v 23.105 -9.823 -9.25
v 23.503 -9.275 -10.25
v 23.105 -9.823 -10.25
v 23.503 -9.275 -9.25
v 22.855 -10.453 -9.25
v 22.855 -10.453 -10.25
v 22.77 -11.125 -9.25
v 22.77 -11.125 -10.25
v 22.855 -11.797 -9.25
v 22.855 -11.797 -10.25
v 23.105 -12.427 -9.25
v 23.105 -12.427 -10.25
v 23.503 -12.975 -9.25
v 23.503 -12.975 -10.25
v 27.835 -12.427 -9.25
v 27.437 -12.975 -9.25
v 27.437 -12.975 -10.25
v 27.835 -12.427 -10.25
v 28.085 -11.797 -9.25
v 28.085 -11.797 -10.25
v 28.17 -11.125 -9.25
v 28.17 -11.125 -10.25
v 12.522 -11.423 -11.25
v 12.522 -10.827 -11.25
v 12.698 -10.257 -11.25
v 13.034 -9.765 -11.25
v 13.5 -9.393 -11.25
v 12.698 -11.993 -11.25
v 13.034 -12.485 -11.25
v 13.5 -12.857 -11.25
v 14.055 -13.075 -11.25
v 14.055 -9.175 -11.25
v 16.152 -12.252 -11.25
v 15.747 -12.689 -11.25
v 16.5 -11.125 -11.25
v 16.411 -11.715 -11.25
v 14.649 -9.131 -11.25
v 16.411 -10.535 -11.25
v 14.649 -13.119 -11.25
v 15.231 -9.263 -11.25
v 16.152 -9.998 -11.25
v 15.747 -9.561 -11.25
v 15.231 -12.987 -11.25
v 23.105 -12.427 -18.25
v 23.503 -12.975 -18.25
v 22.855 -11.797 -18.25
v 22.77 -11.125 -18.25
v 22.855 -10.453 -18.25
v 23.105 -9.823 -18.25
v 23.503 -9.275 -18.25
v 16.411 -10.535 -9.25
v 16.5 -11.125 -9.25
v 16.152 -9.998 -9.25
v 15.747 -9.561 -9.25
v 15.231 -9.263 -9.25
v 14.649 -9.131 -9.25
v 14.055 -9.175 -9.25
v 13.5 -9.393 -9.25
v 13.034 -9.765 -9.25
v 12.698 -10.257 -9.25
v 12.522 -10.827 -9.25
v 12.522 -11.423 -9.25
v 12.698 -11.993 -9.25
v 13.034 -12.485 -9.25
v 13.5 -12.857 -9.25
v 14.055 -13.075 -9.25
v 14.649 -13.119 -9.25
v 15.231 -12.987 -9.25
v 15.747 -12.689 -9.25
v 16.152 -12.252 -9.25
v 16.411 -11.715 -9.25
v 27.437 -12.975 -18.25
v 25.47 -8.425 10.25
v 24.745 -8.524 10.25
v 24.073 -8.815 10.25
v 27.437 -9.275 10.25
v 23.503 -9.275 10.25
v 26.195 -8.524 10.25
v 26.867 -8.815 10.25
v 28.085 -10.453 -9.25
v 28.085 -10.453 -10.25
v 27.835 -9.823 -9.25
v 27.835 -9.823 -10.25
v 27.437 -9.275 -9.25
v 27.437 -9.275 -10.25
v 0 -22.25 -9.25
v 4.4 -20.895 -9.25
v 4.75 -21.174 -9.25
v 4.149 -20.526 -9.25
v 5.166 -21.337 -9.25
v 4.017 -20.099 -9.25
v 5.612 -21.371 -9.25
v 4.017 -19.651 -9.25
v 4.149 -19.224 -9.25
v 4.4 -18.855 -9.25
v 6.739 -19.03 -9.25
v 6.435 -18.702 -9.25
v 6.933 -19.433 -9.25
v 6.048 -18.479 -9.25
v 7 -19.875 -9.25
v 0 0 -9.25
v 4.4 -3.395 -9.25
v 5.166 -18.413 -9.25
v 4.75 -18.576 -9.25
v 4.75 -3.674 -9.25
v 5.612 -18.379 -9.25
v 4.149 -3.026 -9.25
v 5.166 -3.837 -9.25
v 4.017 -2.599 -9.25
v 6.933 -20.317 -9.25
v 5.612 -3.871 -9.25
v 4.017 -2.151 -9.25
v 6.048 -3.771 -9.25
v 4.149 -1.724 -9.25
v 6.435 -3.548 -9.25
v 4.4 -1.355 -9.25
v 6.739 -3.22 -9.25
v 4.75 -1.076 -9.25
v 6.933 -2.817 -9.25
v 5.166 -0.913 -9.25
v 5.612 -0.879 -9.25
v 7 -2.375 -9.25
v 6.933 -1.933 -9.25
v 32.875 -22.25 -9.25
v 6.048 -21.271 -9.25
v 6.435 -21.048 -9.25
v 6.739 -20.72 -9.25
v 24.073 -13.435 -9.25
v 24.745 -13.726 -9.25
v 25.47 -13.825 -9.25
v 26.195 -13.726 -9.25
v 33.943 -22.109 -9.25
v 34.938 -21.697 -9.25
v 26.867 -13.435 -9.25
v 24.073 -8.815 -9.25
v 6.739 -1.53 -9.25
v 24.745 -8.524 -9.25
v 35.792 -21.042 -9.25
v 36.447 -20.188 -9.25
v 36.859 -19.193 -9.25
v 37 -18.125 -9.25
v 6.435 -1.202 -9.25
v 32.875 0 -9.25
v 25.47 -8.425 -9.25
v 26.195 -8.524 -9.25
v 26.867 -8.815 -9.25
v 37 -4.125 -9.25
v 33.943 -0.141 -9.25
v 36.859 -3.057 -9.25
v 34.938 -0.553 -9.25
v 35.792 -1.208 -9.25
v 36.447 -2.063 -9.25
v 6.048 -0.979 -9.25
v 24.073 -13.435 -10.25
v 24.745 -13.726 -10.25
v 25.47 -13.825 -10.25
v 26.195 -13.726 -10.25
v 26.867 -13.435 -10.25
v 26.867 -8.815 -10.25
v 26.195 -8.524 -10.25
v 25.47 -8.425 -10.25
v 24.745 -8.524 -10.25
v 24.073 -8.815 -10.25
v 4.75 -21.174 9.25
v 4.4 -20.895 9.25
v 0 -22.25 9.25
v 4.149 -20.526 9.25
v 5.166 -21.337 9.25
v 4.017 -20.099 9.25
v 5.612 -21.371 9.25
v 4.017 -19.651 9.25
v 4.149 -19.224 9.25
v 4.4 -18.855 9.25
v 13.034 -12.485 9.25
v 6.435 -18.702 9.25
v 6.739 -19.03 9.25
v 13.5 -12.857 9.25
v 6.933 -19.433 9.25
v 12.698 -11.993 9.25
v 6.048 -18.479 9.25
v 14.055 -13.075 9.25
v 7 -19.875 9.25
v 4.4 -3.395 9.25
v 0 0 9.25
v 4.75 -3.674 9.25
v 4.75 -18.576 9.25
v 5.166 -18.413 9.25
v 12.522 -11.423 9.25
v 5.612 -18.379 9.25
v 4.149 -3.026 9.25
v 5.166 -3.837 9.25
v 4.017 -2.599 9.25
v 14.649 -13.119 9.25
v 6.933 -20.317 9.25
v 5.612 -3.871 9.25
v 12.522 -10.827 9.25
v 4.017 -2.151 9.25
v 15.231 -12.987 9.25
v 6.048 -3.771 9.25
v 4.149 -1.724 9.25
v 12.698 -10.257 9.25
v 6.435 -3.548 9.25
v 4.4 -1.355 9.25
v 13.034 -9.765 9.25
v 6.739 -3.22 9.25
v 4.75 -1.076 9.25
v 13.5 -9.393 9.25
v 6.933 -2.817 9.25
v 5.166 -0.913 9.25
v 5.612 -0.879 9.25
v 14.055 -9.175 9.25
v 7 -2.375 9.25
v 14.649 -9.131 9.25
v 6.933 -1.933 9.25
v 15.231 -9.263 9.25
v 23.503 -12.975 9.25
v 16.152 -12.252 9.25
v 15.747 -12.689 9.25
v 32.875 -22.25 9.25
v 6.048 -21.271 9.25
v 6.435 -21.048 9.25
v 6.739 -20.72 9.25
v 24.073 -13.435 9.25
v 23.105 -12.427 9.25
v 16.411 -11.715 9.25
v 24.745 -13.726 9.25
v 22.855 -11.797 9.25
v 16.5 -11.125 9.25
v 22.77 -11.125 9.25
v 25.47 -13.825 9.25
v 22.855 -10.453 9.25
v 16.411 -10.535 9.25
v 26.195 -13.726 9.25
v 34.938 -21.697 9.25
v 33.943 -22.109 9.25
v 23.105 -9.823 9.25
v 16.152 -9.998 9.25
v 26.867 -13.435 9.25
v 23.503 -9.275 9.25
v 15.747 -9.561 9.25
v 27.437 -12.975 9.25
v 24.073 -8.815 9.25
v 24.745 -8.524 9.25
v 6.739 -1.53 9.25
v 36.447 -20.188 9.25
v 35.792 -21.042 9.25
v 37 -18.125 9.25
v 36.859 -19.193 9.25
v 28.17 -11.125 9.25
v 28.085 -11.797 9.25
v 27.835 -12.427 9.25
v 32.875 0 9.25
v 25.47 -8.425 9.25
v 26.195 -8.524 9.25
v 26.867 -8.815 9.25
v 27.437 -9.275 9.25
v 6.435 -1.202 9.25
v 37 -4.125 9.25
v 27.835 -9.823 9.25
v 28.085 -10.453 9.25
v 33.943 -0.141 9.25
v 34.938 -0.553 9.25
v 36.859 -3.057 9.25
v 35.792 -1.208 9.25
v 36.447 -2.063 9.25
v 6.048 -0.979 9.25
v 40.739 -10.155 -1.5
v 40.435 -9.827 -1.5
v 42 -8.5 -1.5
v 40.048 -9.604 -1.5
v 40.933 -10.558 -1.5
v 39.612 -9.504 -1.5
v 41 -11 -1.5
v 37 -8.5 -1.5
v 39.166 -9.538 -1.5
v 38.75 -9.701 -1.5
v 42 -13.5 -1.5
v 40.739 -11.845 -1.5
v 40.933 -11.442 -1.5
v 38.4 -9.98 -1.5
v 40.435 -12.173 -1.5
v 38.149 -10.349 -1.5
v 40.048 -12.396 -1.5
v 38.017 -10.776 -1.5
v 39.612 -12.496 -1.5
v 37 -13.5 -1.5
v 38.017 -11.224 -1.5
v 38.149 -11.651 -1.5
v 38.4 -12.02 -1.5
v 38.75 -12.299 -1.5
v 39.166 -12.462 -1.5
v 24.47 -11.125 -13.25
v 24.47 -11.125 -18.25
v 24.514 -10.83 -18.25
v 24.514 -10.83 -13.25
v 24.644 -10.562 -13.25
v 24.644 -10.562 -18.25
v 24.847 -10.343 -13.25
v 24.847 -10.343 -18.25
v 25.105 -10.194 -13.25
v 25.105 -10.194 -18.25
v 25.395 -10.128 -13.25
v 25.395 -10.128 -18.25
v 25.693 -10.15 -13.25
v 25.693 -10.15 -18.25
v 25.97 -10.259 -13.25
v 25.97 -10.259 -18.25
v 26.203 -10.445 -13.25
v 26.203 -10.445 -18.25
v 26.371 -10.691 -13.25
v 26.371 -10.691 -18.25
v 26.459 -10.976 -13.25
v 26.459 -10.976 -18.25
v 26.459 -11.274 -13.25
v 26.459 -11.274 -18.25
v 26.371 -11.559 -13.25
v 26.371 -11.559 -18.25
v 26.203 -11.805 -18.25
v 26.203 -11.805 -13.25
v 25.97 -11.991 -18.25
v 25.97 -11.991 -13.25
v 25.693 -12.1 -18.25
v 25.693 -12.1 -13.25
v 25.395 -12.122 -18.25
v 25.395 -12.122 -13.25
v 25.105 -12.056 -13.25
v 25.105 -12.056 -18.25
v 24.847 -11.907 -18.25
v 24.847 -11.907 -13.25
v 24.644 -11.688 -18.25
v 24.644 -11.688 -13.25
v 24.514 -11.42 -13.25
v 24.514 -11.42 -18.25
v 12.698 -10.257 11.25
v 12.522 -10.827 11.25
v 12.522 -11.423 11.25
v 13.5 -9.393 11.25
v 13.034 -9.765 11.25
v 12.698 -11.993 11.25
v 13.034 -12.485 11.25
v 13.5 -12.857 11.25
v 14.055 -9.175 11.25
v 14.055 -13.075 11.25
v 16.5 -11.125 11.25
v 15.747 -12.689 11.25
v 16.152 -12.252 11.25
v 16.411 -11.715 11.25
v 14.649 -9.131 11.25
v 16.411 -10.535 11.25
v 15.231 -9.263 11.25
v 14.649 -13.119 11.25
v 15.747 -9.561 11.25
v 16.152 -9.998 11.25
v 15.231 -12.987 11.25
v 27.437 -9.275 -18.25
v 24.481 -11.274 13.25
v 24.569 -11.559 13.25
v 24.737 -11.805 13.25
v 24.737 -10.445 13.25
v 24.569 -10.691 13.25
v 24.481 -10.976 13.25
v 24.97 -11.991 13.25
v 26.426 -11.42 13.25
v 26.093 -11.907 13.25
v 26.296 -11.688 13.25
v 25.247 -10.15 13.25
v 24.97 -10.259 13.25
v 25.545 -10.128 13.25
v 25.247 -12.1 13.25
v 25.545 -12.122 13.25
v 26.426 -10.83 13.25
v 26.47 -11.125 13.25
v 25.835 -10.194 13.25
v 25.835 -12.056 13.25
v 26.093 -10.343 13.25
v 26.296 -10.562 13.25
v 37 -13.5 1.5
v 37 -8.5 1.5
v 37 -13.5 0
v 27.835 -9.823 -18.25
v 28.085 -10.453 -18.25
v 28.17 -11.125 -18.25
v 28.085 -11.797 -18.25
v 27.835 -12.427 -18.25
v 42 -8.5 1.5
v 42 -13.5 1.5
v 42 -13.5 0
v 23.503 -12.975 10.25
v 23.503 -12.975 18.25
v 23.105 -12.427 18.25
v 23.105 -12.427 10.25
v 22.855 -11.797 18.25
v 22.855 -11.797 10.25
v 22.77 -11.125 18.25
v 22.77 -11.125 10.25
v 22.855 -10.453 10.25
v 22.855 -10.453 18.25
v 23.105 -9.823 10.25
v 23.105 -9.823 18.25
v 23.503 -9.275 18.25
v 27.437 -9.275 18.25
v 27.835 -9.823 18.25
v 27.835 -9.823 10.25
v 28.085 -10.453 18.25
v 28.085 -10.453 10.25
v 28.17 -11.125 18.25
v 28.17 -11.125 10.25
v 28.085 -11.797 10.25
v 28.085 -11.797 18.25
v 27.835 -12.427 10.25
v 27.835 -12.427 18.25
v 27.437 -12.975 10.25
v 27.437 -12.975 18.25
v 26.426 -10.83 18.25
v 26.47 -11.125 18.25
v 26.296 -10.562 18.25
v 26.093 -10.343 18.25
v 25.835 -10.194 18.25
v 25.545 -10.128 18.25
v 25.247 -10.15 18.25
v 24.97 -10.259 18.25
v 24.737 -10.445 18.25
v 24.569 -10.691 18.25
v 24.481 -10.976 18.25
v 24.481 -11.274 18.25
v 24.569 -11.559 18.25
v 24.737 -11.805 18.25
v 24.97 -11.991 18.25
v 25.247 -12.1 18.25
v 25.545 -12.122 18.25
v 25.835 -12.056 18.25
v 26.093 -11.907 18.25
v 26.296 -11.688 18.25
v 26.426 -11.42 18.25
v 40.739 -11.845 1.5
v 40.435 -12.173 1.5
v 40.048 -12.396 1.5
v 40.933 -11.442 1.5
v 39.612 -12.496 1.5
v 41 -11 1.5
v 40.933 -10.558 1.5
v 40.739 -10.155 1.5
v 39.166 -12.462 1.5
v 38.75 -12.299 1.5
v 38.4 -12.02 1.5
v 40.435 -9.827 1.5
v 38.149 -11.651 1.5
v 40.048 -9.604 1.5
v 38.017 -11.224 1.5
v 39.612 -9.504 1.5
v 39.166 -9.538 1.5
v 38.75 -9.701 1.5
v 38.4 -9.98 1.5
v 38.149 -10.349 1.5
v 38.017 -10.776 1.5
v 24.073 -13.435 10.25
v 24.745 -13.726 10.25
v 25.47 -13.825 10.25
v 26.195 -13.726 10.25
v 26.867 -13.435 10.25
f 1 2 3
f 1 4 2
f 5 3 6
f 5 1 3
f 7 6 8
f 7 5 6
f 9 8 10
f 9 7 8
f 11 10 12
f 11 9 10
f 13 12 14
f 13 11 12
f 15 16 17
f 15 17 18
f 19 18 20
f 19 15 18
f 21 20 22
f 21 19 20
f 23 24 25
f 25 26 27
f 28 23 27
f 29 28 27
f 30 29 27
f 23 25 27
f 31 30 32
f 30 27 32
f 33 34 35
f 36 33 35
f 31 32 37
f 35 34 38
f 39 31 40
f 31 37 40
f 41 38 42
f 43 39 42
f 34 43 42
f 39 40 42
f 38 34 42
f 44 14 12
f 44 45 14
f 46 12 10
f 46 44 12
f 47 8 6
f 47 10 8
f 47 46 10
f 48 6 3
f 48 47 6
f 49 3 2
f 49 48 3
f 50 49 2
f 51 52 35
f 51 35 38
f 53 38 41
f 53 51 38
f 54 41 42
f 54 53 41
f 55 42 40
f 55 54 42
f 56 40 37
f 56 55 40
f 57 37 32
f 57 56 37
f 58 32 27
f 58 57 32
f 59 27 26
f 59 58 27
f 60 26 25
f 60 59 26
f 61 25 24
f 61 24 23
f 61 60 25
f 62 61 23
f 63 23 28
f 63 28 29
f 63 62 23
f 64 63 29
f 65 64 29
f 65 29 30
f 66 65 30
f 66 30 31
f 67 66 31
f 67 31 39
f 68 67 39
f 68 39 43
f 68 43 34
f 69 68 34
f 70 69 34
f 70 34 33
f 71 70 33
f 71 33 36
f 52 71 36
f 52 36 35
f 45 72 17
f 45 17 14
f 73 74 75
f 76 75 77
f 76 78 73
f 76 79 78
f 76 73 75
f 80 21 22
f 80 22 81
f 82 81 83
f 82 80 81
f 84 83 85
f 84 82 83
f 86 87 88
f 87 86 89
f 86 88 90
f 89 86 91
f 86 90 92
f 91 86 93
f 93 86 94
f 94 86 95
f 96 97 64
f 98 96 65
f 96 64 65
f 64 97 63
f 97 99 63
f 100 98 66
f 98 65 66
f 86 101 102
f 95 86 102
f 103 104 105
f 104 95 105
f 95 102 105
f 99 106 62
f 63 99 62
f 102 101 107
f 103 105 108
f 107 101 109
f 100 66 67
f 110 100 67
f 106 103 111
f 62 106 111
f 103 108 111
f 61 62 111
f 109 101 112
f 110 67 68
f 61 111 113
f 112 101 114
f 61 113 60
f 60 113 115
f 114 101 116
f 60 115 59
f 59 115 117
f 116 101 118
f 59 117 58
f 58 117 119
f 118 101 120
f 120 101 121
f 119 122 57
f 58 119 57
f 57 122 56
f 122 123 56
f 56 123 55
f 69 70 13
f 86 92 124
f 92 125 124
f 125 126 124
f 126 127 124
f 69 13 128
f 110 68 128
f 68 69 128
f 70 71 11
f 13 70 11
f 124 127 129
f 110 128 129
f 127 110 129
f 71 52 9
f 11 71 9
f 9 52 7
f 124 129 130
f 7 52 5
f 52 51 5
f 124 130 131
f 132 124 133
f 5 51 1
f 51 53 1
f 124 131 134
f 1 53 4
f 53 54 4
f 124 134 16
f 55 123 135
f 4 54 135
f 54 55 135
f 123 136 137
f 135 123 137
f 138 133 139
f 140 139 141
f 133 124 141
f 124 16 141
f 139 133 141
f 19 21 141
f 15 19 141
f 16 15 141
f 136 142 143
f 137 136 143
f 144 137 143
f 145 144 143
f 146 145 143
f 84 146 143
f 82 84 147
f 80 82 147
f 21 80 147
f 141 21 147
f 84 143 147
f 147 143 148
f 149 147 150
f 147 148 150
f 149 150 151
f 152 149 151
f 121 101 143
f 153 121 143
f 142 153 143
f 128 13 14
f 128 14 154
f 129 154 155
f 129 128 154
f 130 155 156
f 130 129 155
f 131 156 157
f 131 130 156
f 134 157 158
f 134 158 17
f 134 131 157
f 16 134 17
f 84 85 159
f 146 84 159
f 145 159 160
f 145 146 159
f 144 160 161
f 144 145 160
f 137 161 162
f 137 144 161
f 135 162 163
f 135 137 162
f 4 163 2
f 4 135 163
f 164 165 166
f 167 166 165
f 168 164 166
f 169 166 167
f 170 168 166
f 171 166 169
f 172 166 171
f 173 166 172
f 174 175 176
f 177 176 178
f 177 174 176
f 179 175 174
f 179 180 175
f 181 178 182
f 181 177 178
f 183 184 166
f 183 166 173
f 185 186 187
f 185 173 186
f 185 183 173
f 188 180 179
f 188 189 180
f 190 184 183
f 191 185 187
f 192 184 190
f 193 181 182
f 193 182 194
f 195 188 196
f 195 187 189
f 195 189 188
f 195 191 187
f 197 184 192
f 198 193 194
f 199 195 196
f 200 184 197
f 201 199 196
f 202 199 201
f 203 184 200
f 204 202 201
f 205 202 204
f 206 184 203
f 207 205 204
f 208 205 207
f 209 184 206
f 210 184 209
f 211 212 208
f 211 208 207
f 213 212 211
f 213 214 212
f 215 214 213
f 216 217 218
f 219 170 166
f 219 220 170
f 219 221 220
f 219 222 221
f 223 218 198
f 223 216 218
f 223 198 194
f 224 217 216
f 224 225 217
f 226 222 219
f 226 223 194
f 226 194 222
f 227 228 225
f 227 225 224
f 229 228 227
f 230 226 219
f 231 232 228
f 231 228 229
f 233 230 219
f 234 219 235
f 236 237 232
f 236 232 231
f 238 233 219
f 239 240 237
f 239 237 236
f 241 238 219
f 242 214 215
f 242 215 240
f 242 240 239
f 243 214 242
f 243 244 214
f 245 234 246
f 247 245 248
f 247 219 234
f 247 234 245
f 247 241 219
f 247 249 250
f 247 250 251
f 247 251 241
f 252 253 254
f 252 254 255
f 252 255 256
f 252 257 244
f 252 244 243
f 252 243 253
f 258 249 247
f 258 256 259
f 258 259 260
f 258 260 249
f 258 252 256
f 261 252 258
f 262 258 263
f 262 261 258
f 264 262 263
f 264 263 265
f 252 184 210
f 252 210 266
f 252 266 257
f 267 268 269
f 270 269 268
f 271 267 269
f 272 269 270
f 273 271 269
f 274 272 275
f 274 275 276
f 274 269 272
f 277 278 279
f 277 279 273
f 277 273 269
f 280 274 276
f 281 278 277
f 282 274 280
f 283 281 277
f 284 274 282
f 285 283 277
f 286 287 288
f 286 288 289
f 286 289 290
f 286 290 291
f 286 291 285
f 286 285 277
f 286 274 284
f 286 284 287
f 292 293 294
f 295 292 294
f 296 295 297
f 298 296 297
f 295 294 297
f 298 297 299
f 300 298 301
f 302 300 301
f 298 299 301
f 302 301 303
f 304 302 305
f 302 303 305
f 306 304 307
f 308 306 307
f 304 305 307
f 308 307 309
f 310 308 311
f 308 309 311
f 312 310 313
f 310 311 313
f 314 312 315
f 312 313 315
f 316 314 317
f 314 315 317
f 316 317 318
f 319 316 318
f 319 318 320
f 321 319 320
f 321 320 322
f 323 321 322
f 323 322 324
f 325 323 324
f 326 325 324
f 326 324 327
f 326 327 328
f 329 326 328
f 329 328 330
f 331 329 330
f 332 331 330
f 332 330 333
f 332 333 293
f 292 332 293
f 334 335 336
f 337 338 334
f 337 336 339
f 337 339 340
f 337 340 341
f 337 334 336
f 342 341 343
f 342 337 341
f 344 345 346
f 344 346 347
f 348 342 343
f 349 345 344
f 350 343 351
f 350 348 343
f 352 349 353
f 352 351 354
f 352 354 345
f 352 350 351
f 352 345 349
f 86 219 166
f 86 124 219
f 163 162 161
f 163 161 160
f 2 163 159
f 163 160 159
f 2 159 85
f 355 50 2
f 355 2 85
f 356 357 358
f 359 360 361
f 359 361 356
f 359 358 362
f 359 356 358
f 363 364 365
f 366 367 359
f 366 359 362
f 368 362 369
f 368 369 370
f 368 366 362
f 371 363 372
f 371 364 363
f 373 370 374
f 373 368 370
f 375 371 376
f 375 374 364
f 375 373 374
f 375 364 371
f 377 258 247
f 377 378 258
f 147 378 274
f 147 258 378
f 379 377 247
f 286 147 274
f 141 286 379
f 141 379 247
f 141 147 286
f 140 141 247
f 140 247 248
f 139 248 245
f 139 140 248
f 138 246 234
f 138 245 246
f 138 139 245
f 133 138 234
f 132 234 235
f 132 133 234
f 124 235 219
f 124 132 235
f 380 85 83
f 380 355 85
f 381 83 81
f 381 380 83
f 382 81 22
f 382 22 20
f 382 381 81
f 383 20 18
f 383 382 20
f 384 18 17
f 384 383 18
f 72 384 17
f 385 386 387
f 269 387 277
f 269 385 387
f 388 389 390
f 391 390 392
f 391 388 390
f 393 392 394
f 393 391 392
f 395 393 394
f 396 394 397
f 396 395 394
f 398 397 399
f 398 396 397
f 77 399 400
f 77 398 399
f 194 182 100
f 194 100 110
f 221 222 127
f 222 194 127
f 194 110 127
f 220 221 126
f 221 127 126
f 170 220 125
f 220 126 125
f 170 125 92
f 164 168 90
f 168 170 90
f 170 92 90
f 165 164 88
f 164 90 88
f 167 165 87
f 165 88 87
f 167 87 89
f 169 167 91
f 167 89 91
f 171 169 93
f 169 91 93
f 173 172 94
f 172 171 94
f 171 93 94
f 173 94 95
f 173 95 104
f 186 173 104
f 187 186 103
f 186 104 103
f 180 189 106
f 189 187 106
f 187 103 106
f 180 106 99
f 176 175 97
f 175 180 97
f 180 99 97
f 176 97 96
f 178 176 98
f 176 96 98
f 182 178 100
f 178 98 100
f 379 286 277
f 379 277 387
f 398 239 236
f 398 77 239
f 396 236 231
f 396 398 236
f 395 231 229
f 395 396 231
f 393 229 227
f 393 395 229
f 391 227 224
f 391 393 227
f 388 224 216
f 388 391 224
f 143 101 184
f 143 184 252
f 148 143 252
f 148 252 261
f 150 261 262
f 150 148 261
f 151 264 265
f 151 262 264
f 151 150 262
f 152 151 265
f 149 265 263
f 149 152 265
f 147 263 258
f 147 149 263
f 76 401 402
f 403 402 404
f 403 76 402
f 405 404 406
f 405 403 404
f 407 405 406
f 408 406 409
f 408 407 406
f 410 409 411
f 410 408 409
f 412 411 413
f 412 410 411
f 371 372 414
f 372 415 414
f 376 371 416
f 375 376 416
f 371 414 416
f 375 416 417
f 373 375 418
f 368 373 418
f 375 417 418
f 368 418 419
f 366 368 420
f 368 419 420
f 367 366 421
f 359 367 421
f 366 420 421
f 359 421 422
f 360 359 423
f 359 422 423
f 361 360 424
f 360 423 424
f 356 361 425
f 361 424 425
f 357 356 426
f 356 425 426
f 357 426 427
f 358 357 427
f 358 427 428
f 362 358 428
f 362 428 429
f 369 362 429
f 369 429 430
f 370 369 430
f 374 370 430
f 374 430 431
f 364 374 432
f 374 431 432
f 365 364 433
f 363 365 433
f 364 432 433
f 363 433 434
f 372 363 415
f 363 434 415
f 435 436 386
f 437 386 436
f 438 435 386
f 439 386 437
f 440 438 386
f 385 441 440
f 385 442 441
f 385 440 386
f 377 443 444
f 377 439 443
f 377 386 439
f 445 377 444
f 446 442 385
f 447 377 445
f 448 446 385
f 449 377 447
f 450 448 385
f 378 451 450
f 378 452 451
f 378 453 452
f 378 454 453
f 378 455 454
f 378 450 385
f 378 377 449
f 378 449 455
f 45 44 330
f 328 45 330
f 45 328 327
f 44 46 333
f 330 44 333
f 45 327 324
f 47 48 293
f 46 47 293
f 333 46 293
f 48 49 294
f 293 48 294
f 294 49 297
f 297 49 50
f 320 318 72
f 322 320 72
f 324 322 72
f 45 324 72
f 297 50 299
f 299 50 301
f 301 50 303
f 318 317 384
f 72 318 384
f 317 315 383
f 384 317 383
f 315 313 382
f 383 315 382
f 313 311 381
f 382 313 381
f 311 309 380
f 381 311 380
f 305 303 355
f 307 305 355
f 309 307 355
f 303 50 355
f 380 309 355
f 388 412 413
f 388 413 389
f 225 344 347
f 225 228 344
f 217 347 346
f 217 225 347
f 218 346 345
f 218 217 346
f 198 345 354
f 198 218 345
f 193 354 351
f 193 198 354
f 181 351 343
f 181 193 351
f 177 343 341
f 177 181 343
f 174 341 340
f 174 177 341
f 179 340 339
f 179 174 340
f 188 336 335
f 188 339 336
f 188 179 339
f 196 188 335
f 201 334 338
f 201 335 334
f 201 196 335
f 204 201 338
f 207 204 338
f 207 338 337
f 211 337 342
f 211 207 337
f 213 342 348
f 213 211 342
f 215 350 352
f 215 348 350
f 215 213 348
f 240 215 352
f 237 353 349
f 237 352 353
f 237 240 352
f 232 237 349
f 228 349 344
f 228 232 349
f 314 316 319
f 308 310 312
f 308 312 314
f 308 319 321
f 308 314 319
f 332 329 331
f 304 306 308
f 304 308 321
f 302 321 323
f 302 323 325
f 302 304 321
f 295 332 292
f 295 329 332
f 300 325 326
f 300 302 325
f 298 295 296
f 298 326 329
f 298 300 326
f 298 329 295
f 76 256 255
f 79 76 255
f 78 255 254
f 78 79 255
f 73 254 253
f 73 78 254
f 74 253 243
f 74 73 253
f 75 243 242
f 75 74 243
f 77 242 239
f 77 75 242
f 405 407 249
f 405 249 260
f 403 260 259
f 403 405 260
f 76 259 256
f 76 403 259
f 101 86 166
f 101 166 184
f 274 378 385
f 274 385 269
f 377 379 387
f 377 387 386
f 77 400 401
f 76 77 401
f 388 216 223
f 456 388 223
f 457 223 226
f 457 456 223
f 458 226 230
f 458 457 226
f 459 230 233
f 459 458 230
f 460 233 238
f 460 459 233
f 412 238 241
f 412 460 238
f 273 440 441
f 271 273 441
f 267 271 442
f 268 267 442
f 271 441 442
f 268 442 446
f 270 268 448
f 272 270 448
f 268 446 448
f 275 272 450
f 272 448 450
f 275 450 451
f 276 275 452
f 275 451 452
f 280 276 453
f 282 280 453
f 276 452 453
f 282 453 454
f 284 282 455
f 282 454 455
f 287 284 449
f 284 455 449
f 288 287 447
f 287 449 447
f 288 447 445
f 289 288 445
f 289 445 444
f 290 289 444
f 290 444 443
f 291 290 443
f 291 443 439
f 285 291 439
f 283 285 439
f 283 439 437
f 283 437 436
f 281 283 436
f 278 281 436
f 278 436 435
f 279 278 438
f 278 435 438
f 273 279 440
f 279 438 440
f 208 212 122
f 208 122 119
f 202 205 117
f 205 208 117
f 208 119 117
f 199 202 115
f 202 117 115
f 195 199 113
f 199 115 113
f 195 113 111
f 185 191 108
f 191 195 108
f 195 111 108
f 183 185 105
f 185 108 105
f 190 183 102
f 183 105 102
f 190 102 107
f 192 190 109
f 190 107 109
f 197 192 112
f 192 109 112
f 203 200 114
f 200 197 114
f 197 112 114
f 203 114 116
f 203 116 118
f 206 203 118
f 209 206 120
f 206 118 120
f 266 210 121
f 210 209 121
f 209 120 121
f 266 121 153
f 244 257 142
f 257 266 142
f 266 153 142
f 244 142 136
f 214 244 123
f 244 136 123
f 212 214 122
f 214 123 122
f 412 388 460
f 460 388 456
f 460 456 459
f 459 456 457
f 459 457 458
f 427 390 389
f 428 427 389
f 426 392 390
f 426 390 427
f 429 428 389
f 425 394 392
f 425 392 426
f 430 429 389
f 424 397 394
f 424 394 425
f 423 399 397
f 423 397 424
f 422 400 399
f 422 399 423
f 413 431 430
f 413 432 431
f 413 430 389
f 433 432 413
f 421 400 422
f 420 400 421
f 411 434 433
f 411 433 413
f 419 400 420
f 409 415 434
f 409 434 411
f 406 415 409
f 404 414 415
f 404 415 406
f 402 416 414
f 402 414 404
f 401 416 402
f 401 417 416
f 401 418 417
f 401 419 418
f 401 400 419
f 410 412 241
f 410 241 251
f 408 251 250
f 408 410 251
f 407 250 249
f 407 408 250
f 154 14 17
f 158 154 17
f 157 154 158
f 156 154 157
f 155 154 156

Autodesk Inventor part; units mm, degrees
ref_plane "YZ Plane" through (0, 0, 0) normal (1, 0, 0) x (0, 1, 0)
ref_plane "XZ Plane" through (0, 0, 0) normal (0, 1, 0) x (-1, 0, 0)
ref_plane "XY Plane" through (0, 0, 0) normal (0, 0, 1) x (1, 0, 0)
sketch "Sketch1" plane through (0, 0, 0) normal (0, 0, 1) x (1, 0, 0)
  line L0 (0, 0) -> (32.875, 0)
  line L1 (37, 0) -> (37, -4.125)
  line L2 (37, -22.25) -> (0, -22.25)
  line L3 (0, -22.25) -> (0, -11.125)
  line L4 (0, -11.125) -> (37, -11.125) construction
  line L5 (0, -11.125) -> (0, 0)
  circle A0 centre (14.5, -11.125) radius 2
  circle A1 centre (5.5, -2.375) radius 1.5
  arc A2 (37, -4.125) -> (32.875, 0) centre (32.875, -4.125) ccw
  line L6 (32.875, 0) -> (37, 0)
  line L7 (37, -4.125) -> (37, -22.25)
  arc A3 (32.875, -22.25) -> (37, -18.125) centre (32.875, -18.125) ccw
  circle A4 centre (5.5, -19.875) radius 1.5
  circle A5 centre (25.47, -11.125) radius 2.7
  line L8 (23.5034, -9.275) -> (27.4366, -9.275)
  line L9 (27.4366, -12.975) -> (23.5034, -12.975)
  point P0 (36.5, -18.125)
  point P1 (36.9, -18.125)
  dimension "d6" = 4
  dimension "d8" = 3
  dimension "d11" = 5.5
  dimension "d12" = 22.25
  dimension "d13" = 8.75
  dimension "d16" = 14.5
  dimension "d17" = 14
  dimension "d18" = 37
  dimension "d19" = 3.7
  dimension "d28" = 5.4
  dimension "d29" = 11.53
extrude "Extrusion1" add sketch "Sketch1" along normal mid plane 18.5 contours L0 A2 L7 A3 L2 L3 L5
extrude "Extrusion2" add sketch "Sketch1" along normal mid plane 22.5 contours A0
extrude "Extrusion3" add sketch "Sketch1" along normal mid plane 20.5 contours A5 L9 L8 | L8 A5 | A5 L9
extrude "Extrusion4" add sketch "Sketch1" along normal mid plane 36.5 contours A5 L9 L8
sketch "Sketch2" plane through (0, -22.25, 9.25) normal (-1, 0, 0) x (0, 0, 1)
  point P0 (-9.25, 22.25)
sketch "Sketch3" plane through (0, 0, -18.25) normal (0, 0, -1) x (-1, 0, 0)
  circle A0 centre (-25.47, -11.125) radius 1
  arc A1 (-23.5034, -12.975) -> (-23.5034, -9.275) centre (-25.47, -11.125) ccw projected
  point P0 (0, 0)
  dimension "d30" = 2
extrude "Extrusion5" cut sketch "Sketch3" against normal blind 5
sketch "Sketch4" plane through (0, 0, 18.25) normal (0, 0, 1) x (1, 0, 0)
  circle A0 centre (25.47, -11.125) radius 1
  arc A1 (27.4366, -12.975) -> (27.4366, -9.275) centre (25.47, -11.125) ccw projected
  point P0 (0, 0)
  dimension "d33" = 2
extrude "Extrusion6" cut sketch "Sketch4" against normal blind 5
sketch "Sketch5" plane through (37, -18.125, 9.25) normal (1, 0, 0) x (0, 0, -1)
  line L0 (9.25, 18.125) -> (9.25, 0) construction
  line L1 (18.5, 0) -> (0, 0) projected
  line L2 (7.75, 9.625) -> (10.75, 9.625)
  line L3 (10.75, 9.625) -> (10.75, 4.625)
  line L4 (10.75, 4.625) -> (9.25, 4.625)
  line L5 (7.75, 4.625) -> (7.75, 9.625)
  line L6 (9.25, 4.625) -> (7.75, 4.625)
  dimension "d36" = 3
  dimension "d37" = 5
  dimension "d38" = 8.5
extrude "Extrusion7" add sketch "Sketch5" along normal blind 5
sketch "Sketch6" plane through (37, -13.5, 1.5) normal (0, 0, 1) x (1, 0, 0)
  circle A0 centre (2.5, 2.5) radius 1.5
  line L0 (5, 0) -> (5, 2.5) construction
  line L1 (5, 5) -> (5, 0) construction
  line L2 (5, 0) -> (5, 5) construction
  line L3 (5, 2.5) -> (0, 2.5) construction
  line L4 (5, 2.5) -> (5, 5) construction
  line L5 (5, 5) -> (5, 0) construction
  line L6 (0, 5) -> (5, 5) construction
  line L7 (2.5, 5) -> (2.5, 0) construction
  line L8 (0, 0) -> (5, 0) projected
  line L9 (0, 5) -> (0, 0) construction
  line L10 (0, 5) -> (0, 2.5) construction
  point P0 (-37, 13.5)
  point P1 (2.5, 2.5)
  dimension "d41" = 3
extrude "Extrusion8" cut sketch "Sketch6" against normal blind 5
ref_plane "Work Plane1" through (0, 0, 0) normal (0, 0, 1) x (1, 0, 0)
ref_plane "Work Plane2" through (0, -11.125, 9.25) normal (0, -1, 0) x (1, 0, 0)
properties part number "TT motor output"
